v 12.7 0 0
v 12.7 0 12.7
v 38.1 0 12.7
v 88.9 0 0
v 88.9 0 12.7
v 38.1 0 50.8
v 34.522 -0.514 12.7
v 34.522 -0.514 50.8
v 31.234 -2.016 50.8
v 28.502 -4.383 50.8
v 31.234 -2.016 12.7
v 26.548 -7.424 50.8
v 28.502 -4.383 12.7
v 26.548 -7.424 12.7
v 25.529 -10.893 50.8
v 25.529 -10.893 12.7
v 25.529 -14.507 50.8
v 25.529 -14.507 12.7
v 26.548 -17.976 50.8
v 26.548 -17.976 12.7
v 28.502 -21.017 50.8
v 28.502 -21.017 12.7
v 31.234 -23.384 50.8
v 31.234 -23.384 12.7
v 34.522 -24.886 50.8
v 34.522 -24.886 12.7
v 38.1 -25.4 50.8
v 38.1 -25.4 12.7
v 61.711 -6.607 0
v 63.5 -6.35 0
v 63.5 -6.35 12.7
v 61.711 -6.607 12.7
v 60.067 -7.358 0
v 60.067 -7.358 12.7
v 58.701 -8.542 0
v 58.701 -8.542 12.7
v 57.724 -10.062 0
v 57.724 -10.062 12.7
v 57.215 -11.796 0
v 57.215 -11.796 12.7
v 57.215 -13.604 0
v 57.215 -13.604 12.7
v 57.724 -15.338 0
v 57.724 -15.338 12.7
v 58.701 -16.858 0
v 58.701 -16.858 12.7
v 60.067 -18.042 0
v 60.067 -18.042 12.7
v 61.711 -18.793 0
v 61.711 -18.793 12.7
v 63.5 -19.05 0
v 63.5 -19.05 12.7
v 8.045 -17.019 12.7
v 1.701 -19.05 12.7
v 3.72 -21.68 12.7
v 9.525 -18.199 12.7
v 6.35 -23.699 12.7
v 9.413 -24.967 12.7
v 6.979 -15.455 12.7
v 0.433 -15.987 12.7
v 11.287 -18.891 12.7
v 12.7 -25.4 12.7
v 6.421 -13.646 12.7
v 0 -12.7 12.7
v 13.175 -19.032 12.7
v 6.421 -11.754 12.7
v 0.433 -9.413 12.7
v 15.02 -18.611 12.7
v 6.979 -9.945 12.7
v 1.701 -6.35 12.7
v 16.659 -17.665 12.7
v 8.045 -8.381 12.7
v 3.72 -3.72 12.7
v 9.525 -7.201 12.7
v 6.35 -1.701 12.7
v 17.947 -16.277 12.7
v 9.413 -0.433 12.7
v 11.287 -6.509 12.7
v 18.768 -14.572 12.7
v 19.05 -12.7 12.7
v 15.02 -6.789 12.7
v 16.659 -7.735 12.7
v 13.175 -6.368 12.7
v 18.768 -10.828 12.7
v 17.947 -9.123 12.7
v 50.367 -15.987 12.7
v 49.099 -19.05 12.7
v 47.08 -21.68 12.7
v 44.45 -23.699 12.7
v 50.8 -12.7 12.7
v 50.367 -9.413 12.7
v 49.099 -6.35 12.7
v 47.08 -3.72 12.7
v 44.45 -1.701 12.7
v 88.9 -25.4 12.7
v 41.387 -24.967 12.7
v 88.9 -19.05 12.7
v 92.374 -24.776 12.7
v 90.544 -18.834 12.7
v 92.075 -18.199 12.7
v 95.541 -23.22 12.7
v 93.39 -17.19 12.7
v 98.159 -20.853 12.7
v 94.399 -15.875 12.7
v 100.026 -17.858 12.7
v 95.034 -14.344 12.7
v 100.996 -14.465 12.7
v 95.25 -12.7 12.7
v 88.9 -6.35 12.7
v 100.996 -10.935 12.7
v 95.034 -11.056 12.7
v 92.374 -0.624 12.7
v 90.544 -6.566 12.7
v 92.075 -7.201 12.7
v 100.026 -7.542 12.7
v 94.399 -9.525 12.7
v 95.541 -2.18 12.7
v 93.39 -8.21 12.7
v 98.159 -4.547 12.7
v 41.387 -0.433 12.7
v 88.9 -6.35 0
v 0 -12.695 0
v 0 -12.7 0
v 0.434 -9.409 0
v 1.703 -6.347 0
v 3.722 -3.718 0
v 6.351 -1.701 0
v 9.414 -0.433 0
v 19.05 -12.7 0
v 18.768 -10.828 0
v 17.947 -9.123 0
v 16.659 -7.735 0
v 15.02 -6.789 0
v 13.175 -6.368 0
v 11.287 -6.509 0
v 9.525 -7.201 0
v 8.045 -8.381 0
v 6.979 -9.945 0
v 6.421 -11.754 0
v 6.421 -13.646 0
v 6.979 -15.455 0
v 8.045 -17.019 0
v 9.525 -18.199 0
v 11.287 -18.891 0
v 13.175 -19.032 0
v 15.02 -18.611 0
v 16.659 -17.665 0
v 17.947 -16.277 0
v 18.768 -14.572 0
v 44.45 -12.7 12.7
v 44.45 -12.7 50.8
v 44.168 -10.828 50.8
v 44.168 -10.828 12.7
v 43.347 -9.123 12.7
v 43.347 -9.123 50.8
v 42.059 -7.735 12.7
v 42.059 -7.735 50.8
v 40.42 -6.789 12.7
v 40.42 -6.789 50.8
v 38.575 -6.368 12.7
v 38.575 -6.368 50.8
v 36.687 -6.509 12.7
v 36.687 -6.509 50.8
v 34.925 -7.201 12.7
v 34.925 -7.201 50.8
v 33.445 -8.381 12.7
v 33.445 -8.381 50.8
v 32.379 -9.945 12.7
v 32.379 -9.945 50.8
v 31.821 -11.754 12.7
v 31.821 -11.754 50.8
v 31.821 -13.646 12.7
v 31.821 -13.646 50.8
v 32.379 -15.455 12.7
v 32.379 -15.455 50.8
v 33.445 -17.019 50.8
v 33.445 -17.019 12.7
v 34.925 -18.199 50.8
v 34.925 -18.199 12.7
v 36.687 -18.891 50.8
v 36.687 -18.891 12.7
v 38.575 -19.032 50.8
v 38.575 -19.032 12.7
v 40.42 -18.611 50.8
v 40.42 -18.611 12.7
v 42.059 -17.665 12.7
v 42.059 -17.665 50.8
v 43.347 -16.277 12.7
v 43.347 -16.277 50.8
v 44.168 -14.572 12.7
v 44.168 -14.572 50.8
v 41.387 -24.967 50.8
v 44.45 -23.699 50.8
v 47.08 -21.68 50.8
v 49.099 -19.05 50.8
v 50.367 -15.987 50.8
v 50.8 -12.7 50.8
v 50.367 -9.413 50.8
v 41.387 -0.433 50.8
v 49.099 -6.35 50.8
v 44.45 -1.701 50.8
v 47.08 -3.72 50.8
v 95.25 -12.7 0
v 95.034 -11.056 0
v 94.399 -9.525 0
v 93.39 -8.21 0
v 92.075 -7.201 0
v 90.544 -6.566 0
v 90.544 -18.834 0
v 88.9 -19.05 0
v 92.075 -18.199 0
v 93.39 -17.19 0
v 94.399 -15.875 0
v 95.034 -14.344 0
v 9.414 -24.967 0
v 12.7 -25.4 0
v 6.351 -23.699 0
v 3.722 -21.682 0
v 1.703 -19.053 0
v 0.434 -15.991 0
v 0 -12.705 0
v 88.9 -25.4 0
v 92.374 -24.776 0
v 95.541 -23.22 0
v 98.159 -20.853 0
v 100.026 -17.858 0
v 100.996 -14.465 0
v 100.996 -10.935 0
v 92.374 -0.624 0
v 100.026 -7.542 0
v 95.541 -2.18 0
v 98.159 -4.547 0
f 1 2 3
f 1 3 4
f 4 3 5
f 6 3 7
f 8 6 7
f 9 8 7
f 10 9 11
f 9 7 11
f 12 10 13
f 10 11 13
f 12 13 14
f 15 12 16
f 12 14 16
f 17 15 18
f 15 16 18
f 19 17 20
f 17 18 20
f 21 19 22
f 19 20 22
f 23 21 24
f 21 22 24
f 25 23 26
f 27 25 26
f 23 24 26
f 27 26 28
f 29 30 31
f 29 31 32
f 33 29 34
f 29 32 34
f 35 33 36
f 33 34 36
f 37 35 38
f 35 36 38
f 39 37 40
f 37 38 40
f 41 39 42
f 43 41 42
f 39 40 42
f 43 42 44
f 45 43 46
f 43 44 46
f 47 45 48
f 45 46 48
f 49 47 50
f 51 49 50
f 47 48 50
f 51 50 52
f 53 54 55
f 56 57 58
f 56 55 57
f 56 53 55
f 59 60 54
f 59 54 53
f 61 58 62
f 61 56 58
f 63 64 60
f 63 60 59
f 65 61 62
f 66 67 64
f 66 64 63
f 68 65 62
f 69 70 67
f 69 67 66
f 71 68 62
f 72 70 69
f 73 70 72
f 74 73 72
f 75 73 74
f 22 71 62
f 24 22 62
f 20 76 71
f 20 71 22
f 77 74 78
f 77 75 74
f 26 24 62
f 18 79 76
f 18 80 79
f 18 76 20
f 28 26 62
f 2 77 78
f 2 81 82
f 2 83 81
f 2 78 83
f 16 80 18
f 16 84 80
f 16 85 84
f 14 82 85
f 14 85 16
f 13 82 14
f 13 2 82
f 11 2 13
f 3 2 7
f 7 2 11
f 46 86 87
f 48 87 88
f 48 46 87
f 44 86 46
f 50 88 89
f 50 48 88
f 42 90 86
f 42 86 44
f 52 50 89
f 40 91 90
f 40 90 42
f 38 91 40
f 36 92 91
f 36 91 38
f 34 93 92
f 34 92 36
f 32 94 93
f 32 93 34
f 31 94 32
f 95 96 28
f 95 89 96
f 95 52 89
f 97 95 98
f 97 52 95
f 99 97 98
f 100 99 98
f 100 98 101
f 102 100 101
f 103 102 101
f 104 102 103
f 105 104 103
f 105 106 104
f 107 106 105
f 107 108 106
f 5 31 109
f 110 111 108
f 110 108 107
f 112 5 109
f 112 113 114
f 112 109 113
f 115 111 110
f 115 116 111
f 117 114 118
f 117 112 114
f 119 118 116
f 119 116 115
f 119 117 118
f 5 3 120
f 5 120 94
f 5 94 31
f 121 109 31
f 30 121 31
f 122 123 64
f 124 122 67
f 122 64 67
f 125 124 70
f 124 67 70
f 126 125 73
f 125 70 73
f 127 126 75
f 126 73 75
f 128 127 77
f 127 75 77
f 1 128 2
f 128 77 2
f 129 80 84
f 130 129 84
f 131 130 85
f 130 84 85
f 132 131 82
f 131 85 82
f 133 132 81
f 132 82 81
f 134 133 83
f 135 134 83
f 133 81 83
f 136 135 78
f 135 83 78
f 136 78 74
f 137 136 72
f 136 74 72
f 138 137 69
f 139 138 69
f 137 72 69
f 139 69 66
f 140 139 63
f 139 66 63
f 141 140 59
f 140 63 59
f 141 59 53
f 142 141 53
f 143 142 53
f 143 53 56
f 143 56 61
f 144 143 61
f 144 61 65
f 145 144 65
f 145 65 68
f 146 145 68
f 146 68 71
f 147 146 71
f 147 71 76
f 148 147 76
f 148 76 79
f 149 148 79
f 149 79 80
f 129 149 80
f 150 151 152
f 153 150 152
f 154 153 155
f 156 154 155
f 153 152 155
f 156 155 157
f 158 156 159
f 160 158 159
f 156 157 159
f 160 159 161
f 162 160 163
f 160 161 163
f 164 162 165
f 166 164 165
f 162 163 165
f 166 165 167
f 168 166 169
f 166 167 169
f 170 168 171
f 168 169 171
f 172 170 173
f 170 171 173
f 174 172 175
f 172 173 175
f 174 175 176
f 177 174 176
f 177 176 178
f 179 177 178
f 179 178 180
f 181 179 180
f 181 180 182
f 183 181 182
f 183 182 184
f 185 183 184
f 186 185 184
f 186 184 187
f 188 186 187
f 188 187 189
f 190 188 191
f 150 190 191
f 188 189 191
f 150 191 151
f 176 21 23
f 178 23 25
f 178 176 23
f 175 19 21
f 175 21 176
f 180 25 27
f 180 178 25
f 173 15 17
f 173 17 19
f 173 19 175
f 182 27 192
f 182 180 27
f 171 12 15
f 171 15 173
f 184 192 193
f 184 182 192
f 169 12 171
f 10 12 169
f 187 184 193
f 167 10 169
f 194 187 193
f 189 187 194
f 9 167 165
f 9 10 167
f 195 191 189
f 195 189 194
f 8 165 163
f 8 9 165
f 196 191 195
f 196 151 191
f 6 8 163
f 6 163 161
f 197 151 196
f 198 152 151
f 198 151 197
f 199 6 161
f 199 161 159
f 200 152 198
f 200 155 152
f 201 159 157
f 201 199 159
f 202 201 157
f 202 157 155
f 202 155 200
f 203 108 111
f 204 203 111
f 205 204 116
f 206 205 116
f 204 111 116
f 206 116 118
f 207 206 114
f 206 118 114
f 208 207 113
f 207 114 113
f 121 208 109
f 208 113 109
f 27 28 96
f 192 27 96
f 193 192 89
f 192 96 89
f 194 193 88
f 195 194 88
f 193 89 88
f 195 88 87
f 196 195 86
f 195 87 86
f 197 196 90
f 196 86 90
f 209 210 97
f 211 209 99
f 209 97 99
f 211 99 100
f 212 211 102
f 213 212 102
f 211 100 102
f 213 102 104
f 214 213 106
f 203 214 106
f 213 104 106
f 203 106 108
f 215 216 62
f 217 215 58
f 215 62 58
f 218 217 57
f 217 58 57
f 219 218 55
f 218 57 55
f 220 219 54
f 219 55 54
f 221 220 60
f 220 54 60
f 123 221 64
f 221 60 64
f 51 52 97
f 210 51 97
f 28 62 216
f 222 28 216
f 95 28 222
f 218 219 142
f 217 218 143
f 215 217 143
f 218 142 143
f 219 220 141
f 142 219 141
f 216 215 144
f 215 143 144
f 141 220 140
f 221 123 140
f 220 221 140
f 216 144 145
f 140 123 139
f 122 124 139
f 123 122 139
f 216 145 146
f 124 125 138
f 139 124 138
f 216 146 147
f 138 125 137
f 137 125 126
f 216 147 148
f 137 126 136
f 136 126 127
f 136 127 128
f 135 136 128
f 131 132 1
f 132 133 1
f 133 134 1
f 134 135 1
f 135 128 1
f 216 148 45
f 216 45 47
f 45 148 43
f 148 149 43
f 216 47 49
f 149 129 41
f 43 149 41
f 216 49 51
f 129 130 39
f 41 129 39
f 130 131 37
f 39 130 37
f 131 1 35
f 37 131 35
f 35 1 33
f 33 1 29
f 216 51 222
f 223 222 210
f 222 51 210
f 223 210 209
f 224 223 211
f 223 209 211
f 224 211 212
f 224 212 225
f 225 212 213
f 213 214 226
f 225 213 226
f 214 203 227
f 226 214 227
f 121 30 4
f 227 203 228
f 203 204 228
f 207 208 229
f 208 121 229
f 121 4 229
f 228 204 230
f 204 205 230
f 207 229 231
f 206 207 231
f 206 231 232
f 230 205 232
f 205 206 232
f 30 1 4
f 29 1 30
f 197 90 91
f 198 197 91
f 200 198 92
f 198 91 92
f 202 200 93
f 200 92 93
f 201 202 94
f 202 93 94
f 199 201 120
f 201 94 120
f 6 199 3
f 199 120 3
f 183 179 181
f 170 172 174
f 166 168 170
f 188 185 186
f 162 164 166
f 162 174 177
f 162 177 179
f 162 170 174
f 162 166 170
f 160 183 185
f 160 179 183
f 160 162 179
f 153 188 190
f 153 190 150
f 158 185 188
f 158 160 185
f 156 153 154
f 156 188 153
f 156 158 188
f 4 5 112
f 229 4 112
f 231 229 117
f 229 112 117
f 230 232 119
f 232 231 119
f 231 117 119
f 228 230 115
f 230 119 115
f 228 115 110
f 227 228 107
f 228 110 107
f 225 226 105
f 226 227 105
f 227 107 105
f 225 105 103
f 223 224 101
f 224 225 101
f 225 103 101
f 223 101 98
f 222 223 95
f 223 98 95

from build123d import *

# Parameters (mm, degrees)
F0_W      = 101.6
F0_H      = 12.7
F1_DEPTH  = 25.4
F2_R      = 6.35
F3_DEPTH  = 25.4
F5_DEPTH  = 25.4
F7_DEPTH  = 25.4
F9_DEPTH  = 38.1
F10_R     = 6.35
F11_DEPTH = 38.1
F13_DEPTH = 25.4


# Not quite as in the source:
# - ends of sketch curves that miss each other by under 0.0002 mm in the source are joined


with BuildPart() as f1:
    # F0 (on Front) → F1 (new body)
    with BuildSketch(Plane.XZ):
        with Locations((50.8, 6.35)):
            Rectangle(F0_W, F0_H)
    extrude(amount=F1_DEPTH)

    # F2 (on face) → F3 (cut)
    with BuildSketch(Plane.XY.offset(12.7)):
        with Locations((12.7, -12.7)):
            Circle(F2_R)
    extrude(amount=-F3_DEPTH, mode=Mode.SUBTRACT)

    # F4 (on face) → F5 (cut)
    with BuildSketch(Plane.XY.offset(12.7)):
        with BuildLine():
            ThreePointArc((-1.0081e-06, -12.7), (3.7197432273, -3.7197435225), (12.7, 0))
            Line((12.7, 0), (0, 0))
            Line((0, 0), (-1.0081e-06, -12.7))
        make_face()
        with BuildLine():
            ThreePointArc((12.6999979839, -25.4), (3.7197425145, -21.6802557647), (-1.0081e-06, -12.7))
            Line((-1.0081e-06, -12.7), (0, -25.4))
            Line((0, -25.4), (12.6999979839, -25.4))
        make_face()
    extrude(amount=-F5_DEPTH, mode=Mode.SUBTRACT)

    # F6 (on face) → F7 (cut)
    with BuildSketch(Plane.XY.offset(12.7)):
        with BuildLine():
            ThreePointArc((63.5, -6.35), (67.9901280605, -8.2098719395), (69.85, -12.7))
            ThreePointArc((69.85, -12.7), (67.9901280605, -17.1901280605), (63.5, -19.05))
            Line((63.5, -19.05), (88.9, -19.05))
            ThreePointArc((88.9, -19.05), (82.55, -12.7), (88.9, -6.35))
            Line((88.9, -6.35), (63.5, -6.35))
        make_face()
        with BuildLine():
            ThreePointArc((63.5, -19.05), (67.9901280605, -17.1901280605), (69.85, -12.7))
            ThreePointArc((69.85, -12.7), (67.9901280605, -8.2098719395), (63.5, -6.35))
            ThreePointArc((63.5, -6.35), (57.15, -12.7), (63.5, -19.05))
        make_face()
        with BuildLine():
            ThreePointArc((95.25, -12.7), (93.3901280605, -8.2098719395), (88.9, -6.35))
            ThreePointArc((88.9, -6.35), (82.55, -12.7), (88.9, -19.05))
            ThreePointArc((88.9, -19.05), (93.3901280605, -17.1901280605), (95.25, -12.7))
        make_face()
    extrude(amount=-F7_DEPTH, mode=Mode.SUBTRACT)

    # F8 (on face) → F9 (join)
    with BuildSketch(Plane.XY.offset(12.7)):
        with BuildLine():
            ThreePointArc((38.1, -25.4), (47.0802561211, -21.6802561211), (50.8, -12.7))
            ThreePointArc((50.8, -12.7), (47.0802561211, -3.7197438789), (38.1, 0))
            ThreePointArc((38.1, 0), (25.4, -12.7), (38.1, -25.4))
        make_face()
    extrude(amount=F9_DEPTH)

    # F10 (on face) → F11 (cut)
    with BuildSketch(Plane.XY.offset(50.8)):
        with Locations((38.1, -12.7)):
            Circle(F10_R)
    extrude(amount=-F11_DEPTH, mode=Mode.SUBTRACT)

    # F12 (on face) → F13 (cut)
    with BuildSketch(Plane.XY.offset(12.7)):
        with BuildLine():
            ThreePointArc((88.9, 0), (101.1192301161, -12.7), (88.9, -25.4))
            Line((88.9, -25.4), (101.6, -25.4))
            Line((101.6, -25.4), (101.6, 0))
            Line((101.6, 0), (88.9, 0))
        make_face()
    extrude(amount=-F13_DEPTH, mode=Mode.SUBTRACT)


solid = f1.part
